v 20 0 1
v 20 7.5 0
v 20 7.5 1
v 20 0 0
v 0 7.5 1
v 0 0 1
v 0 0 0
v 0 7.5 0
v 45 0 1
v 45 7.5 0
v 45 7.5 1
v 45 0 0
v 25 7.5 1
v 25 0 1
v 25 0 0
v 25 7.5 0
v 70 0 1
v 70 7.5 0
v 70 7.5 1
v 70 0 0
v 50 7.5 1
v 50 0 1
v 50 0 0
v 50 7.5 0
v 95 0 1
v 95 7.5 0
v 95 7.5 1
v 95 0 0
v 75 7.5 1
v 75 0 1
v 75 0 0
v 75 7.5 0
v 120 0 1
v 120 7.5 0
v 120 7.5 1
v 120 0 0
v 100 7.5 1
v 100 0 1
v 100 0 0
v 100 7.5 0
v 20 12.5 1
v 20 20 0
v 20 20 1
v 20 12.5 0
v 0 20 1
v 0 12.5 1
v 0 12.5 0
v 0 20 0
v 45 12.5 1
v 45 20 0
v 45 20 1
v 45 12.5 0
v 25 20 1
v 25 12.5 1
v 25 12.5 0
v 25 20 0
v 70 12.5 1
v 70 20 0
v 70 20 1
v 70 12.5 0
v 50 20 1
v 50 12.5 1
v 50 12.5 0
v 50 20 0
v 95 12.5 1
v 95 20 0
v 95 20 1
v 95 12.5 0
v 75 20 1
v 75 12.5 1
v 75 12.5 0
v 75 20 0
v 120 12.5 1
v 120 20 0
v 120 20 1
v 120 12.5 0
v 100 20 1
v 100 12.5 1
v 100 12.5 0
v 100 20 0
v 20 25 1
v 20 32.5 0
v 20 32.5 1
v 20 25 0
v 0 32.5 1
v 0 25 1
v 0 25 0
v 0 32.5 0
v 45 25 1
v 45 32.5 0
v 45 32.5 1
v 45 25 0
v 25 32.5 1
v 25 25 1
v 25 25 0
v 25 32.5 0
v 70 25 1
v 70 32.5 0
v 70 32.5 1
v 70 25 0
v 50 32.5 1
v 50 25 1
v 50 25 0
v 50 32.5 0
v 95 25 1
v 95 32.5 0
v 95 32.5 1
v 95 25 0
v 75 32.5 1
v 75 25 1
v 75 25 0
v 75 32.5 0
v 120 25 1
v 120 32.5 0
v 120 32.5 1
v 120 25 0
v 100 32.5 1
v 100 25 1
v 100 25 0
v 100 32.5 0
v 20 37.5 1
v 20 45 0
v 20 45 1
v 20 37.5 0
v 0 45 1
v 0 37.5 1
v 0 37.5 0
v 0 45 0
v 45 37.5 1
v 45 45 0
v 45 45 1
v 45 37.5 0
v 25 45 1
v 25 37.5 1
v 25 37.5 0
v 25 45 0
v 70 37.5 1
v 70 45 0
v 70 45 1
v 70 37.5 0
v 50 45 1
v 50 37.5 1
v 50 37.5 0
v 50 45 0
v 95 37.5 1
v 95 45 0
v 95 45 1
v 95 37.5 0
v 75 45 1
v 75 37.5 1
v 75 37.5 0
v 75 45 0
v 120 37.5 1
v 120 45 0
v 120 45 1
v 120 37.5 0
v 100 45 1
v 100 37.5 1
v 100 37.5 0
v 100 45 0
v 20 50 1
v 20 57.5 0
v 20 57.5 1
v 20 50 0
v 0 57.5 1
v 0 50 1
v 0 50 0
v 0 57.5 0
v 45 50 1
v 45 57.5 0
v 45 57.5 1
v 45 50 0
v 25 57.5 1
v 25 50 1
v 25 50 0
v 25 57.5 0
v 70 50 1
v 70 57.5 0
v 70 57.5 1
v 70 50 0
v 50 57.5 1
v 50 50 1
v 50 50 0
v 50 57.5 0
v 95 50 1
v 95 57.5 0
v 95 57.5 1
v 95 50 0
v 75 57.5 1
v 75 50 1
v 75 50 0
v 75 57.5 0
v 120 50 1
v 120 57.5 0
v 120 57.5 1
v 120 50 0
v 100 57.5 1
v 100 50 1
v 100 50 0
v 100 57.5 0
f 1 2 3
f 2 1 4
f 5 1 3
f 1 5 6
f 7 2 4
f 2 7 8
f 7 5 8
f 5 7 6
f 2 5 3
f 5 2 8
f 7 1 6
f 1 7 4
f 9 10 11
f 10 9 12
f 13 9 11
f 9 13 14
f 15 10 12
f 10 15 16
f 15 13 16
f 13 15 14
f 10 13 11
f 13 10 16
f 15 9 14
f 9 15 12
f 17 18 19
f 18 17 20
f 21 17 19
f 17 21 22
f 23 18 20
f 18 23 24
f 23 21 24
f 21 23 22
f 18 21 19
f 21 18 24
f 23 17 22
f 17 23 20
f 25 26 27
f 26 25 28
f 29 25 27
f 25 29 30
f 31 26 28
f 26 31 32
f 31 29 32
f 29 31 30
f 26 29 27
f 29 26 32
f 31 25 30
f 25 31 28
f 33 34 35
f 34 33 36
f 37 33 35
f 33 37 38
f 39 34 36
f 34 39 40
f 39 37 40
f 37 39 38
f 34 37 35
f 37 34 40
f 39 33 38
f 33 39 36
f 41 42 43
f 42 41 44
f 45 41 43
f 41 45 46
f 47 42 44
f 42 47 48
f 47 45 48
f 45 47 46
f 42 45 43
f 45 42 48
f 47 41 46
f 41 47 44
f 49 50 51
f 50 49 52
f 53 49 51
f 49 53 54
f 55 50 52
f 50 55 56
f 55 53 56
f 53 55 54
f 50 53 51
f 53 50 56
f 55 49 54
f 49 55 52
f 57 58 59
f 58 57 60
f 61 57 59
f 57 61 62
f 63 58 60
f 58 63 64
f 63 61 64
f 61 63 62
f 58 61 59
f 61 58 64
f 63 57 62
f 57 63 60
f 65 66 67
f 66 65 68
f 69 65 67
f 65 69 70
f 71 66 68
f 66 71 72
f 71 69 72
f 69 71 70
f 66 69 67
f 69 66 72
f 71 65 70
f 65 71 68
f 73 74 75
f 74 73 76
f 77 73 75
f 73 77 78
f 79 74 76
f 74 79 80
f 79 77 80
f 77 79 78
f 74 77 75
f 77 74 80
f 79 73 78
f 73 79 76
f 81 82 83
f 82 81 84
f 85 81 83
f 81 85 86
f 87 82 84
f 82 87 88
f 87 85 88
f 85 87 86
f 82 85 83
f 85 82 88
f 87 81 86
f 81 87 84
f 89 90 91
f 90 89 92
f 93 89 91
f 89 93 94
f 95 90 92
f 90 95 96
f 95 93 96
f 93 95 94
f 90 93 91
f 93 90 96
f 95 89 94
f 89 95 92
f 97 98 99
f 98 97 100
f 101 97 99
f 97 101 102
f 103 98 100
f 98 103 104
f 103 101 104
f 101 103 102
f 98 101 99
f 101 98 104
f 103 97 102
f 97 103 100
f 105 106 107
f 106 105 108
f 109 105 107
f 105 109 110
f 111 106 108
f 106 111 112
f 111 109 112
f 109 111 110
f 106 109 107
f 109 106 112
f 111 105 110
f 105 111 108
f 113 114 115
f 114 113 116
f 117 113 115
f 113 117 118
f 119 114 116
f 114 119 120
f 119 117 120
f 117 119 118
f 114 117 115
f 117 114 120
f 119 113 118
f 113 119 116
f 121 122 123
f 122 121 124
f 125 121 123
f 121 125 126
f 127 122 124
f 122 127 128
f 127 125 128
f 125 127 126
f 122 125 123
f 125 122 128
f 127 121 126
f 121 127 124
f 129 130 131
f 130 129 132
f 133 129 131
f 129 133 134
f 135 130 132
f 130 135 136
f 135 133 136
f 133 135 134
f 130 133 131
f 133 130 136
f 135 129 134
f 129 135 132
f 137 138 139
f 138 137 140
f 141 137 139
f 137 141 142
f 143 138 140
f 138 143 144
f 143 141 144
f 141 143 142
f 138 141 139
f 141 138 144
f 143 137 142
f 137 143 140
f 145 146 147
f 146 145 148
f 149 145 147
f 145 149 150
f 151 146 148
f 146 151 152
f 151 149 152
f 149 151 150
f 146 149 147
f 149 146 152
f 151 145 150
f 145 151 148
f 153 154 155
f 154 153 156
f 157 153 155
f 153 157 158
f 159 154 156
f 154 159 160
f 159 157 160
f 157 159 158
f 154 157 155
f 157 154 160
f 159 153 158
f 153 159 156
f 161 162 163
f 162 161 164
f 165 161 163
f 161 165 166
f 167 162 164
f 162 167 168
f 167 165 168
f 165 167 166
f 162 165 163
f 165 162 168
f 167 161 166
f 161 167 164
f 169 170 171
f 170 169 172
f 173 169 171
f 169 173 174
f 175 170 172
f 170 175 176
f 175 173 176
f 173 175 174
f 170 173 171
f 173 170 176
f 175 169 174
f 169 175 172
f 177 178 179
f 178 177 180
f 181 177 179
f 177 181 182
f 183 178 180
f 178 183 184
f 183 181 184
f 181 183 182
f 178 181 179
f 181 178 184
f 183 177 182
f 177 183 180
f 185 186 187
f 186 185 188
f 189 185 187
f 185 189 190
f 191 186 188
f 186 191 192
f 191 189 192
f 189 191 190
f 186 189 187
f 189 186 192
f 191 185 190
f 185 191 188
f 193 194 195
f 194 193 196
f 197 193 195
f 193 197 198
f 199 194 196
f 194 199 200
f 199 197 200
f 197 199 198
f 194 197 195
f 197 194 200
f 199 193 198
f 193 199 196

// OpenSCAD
module makeVentGrill(width, height) {
    cutoutSize = [20, 7.50];
    spacing = 5;
    for(y = [0:height - 1]) {
        for(x = [0:width - 1]) {
            translate([
                x * (cutoutSize[0] + spacing),
                y * (cutoutSize[1] + spacing),
                0
            ])
            cube([cutoutSize[0], cutoutSize[1], 1]);
        }
    }
}

makeVentGrill(5, 5);
